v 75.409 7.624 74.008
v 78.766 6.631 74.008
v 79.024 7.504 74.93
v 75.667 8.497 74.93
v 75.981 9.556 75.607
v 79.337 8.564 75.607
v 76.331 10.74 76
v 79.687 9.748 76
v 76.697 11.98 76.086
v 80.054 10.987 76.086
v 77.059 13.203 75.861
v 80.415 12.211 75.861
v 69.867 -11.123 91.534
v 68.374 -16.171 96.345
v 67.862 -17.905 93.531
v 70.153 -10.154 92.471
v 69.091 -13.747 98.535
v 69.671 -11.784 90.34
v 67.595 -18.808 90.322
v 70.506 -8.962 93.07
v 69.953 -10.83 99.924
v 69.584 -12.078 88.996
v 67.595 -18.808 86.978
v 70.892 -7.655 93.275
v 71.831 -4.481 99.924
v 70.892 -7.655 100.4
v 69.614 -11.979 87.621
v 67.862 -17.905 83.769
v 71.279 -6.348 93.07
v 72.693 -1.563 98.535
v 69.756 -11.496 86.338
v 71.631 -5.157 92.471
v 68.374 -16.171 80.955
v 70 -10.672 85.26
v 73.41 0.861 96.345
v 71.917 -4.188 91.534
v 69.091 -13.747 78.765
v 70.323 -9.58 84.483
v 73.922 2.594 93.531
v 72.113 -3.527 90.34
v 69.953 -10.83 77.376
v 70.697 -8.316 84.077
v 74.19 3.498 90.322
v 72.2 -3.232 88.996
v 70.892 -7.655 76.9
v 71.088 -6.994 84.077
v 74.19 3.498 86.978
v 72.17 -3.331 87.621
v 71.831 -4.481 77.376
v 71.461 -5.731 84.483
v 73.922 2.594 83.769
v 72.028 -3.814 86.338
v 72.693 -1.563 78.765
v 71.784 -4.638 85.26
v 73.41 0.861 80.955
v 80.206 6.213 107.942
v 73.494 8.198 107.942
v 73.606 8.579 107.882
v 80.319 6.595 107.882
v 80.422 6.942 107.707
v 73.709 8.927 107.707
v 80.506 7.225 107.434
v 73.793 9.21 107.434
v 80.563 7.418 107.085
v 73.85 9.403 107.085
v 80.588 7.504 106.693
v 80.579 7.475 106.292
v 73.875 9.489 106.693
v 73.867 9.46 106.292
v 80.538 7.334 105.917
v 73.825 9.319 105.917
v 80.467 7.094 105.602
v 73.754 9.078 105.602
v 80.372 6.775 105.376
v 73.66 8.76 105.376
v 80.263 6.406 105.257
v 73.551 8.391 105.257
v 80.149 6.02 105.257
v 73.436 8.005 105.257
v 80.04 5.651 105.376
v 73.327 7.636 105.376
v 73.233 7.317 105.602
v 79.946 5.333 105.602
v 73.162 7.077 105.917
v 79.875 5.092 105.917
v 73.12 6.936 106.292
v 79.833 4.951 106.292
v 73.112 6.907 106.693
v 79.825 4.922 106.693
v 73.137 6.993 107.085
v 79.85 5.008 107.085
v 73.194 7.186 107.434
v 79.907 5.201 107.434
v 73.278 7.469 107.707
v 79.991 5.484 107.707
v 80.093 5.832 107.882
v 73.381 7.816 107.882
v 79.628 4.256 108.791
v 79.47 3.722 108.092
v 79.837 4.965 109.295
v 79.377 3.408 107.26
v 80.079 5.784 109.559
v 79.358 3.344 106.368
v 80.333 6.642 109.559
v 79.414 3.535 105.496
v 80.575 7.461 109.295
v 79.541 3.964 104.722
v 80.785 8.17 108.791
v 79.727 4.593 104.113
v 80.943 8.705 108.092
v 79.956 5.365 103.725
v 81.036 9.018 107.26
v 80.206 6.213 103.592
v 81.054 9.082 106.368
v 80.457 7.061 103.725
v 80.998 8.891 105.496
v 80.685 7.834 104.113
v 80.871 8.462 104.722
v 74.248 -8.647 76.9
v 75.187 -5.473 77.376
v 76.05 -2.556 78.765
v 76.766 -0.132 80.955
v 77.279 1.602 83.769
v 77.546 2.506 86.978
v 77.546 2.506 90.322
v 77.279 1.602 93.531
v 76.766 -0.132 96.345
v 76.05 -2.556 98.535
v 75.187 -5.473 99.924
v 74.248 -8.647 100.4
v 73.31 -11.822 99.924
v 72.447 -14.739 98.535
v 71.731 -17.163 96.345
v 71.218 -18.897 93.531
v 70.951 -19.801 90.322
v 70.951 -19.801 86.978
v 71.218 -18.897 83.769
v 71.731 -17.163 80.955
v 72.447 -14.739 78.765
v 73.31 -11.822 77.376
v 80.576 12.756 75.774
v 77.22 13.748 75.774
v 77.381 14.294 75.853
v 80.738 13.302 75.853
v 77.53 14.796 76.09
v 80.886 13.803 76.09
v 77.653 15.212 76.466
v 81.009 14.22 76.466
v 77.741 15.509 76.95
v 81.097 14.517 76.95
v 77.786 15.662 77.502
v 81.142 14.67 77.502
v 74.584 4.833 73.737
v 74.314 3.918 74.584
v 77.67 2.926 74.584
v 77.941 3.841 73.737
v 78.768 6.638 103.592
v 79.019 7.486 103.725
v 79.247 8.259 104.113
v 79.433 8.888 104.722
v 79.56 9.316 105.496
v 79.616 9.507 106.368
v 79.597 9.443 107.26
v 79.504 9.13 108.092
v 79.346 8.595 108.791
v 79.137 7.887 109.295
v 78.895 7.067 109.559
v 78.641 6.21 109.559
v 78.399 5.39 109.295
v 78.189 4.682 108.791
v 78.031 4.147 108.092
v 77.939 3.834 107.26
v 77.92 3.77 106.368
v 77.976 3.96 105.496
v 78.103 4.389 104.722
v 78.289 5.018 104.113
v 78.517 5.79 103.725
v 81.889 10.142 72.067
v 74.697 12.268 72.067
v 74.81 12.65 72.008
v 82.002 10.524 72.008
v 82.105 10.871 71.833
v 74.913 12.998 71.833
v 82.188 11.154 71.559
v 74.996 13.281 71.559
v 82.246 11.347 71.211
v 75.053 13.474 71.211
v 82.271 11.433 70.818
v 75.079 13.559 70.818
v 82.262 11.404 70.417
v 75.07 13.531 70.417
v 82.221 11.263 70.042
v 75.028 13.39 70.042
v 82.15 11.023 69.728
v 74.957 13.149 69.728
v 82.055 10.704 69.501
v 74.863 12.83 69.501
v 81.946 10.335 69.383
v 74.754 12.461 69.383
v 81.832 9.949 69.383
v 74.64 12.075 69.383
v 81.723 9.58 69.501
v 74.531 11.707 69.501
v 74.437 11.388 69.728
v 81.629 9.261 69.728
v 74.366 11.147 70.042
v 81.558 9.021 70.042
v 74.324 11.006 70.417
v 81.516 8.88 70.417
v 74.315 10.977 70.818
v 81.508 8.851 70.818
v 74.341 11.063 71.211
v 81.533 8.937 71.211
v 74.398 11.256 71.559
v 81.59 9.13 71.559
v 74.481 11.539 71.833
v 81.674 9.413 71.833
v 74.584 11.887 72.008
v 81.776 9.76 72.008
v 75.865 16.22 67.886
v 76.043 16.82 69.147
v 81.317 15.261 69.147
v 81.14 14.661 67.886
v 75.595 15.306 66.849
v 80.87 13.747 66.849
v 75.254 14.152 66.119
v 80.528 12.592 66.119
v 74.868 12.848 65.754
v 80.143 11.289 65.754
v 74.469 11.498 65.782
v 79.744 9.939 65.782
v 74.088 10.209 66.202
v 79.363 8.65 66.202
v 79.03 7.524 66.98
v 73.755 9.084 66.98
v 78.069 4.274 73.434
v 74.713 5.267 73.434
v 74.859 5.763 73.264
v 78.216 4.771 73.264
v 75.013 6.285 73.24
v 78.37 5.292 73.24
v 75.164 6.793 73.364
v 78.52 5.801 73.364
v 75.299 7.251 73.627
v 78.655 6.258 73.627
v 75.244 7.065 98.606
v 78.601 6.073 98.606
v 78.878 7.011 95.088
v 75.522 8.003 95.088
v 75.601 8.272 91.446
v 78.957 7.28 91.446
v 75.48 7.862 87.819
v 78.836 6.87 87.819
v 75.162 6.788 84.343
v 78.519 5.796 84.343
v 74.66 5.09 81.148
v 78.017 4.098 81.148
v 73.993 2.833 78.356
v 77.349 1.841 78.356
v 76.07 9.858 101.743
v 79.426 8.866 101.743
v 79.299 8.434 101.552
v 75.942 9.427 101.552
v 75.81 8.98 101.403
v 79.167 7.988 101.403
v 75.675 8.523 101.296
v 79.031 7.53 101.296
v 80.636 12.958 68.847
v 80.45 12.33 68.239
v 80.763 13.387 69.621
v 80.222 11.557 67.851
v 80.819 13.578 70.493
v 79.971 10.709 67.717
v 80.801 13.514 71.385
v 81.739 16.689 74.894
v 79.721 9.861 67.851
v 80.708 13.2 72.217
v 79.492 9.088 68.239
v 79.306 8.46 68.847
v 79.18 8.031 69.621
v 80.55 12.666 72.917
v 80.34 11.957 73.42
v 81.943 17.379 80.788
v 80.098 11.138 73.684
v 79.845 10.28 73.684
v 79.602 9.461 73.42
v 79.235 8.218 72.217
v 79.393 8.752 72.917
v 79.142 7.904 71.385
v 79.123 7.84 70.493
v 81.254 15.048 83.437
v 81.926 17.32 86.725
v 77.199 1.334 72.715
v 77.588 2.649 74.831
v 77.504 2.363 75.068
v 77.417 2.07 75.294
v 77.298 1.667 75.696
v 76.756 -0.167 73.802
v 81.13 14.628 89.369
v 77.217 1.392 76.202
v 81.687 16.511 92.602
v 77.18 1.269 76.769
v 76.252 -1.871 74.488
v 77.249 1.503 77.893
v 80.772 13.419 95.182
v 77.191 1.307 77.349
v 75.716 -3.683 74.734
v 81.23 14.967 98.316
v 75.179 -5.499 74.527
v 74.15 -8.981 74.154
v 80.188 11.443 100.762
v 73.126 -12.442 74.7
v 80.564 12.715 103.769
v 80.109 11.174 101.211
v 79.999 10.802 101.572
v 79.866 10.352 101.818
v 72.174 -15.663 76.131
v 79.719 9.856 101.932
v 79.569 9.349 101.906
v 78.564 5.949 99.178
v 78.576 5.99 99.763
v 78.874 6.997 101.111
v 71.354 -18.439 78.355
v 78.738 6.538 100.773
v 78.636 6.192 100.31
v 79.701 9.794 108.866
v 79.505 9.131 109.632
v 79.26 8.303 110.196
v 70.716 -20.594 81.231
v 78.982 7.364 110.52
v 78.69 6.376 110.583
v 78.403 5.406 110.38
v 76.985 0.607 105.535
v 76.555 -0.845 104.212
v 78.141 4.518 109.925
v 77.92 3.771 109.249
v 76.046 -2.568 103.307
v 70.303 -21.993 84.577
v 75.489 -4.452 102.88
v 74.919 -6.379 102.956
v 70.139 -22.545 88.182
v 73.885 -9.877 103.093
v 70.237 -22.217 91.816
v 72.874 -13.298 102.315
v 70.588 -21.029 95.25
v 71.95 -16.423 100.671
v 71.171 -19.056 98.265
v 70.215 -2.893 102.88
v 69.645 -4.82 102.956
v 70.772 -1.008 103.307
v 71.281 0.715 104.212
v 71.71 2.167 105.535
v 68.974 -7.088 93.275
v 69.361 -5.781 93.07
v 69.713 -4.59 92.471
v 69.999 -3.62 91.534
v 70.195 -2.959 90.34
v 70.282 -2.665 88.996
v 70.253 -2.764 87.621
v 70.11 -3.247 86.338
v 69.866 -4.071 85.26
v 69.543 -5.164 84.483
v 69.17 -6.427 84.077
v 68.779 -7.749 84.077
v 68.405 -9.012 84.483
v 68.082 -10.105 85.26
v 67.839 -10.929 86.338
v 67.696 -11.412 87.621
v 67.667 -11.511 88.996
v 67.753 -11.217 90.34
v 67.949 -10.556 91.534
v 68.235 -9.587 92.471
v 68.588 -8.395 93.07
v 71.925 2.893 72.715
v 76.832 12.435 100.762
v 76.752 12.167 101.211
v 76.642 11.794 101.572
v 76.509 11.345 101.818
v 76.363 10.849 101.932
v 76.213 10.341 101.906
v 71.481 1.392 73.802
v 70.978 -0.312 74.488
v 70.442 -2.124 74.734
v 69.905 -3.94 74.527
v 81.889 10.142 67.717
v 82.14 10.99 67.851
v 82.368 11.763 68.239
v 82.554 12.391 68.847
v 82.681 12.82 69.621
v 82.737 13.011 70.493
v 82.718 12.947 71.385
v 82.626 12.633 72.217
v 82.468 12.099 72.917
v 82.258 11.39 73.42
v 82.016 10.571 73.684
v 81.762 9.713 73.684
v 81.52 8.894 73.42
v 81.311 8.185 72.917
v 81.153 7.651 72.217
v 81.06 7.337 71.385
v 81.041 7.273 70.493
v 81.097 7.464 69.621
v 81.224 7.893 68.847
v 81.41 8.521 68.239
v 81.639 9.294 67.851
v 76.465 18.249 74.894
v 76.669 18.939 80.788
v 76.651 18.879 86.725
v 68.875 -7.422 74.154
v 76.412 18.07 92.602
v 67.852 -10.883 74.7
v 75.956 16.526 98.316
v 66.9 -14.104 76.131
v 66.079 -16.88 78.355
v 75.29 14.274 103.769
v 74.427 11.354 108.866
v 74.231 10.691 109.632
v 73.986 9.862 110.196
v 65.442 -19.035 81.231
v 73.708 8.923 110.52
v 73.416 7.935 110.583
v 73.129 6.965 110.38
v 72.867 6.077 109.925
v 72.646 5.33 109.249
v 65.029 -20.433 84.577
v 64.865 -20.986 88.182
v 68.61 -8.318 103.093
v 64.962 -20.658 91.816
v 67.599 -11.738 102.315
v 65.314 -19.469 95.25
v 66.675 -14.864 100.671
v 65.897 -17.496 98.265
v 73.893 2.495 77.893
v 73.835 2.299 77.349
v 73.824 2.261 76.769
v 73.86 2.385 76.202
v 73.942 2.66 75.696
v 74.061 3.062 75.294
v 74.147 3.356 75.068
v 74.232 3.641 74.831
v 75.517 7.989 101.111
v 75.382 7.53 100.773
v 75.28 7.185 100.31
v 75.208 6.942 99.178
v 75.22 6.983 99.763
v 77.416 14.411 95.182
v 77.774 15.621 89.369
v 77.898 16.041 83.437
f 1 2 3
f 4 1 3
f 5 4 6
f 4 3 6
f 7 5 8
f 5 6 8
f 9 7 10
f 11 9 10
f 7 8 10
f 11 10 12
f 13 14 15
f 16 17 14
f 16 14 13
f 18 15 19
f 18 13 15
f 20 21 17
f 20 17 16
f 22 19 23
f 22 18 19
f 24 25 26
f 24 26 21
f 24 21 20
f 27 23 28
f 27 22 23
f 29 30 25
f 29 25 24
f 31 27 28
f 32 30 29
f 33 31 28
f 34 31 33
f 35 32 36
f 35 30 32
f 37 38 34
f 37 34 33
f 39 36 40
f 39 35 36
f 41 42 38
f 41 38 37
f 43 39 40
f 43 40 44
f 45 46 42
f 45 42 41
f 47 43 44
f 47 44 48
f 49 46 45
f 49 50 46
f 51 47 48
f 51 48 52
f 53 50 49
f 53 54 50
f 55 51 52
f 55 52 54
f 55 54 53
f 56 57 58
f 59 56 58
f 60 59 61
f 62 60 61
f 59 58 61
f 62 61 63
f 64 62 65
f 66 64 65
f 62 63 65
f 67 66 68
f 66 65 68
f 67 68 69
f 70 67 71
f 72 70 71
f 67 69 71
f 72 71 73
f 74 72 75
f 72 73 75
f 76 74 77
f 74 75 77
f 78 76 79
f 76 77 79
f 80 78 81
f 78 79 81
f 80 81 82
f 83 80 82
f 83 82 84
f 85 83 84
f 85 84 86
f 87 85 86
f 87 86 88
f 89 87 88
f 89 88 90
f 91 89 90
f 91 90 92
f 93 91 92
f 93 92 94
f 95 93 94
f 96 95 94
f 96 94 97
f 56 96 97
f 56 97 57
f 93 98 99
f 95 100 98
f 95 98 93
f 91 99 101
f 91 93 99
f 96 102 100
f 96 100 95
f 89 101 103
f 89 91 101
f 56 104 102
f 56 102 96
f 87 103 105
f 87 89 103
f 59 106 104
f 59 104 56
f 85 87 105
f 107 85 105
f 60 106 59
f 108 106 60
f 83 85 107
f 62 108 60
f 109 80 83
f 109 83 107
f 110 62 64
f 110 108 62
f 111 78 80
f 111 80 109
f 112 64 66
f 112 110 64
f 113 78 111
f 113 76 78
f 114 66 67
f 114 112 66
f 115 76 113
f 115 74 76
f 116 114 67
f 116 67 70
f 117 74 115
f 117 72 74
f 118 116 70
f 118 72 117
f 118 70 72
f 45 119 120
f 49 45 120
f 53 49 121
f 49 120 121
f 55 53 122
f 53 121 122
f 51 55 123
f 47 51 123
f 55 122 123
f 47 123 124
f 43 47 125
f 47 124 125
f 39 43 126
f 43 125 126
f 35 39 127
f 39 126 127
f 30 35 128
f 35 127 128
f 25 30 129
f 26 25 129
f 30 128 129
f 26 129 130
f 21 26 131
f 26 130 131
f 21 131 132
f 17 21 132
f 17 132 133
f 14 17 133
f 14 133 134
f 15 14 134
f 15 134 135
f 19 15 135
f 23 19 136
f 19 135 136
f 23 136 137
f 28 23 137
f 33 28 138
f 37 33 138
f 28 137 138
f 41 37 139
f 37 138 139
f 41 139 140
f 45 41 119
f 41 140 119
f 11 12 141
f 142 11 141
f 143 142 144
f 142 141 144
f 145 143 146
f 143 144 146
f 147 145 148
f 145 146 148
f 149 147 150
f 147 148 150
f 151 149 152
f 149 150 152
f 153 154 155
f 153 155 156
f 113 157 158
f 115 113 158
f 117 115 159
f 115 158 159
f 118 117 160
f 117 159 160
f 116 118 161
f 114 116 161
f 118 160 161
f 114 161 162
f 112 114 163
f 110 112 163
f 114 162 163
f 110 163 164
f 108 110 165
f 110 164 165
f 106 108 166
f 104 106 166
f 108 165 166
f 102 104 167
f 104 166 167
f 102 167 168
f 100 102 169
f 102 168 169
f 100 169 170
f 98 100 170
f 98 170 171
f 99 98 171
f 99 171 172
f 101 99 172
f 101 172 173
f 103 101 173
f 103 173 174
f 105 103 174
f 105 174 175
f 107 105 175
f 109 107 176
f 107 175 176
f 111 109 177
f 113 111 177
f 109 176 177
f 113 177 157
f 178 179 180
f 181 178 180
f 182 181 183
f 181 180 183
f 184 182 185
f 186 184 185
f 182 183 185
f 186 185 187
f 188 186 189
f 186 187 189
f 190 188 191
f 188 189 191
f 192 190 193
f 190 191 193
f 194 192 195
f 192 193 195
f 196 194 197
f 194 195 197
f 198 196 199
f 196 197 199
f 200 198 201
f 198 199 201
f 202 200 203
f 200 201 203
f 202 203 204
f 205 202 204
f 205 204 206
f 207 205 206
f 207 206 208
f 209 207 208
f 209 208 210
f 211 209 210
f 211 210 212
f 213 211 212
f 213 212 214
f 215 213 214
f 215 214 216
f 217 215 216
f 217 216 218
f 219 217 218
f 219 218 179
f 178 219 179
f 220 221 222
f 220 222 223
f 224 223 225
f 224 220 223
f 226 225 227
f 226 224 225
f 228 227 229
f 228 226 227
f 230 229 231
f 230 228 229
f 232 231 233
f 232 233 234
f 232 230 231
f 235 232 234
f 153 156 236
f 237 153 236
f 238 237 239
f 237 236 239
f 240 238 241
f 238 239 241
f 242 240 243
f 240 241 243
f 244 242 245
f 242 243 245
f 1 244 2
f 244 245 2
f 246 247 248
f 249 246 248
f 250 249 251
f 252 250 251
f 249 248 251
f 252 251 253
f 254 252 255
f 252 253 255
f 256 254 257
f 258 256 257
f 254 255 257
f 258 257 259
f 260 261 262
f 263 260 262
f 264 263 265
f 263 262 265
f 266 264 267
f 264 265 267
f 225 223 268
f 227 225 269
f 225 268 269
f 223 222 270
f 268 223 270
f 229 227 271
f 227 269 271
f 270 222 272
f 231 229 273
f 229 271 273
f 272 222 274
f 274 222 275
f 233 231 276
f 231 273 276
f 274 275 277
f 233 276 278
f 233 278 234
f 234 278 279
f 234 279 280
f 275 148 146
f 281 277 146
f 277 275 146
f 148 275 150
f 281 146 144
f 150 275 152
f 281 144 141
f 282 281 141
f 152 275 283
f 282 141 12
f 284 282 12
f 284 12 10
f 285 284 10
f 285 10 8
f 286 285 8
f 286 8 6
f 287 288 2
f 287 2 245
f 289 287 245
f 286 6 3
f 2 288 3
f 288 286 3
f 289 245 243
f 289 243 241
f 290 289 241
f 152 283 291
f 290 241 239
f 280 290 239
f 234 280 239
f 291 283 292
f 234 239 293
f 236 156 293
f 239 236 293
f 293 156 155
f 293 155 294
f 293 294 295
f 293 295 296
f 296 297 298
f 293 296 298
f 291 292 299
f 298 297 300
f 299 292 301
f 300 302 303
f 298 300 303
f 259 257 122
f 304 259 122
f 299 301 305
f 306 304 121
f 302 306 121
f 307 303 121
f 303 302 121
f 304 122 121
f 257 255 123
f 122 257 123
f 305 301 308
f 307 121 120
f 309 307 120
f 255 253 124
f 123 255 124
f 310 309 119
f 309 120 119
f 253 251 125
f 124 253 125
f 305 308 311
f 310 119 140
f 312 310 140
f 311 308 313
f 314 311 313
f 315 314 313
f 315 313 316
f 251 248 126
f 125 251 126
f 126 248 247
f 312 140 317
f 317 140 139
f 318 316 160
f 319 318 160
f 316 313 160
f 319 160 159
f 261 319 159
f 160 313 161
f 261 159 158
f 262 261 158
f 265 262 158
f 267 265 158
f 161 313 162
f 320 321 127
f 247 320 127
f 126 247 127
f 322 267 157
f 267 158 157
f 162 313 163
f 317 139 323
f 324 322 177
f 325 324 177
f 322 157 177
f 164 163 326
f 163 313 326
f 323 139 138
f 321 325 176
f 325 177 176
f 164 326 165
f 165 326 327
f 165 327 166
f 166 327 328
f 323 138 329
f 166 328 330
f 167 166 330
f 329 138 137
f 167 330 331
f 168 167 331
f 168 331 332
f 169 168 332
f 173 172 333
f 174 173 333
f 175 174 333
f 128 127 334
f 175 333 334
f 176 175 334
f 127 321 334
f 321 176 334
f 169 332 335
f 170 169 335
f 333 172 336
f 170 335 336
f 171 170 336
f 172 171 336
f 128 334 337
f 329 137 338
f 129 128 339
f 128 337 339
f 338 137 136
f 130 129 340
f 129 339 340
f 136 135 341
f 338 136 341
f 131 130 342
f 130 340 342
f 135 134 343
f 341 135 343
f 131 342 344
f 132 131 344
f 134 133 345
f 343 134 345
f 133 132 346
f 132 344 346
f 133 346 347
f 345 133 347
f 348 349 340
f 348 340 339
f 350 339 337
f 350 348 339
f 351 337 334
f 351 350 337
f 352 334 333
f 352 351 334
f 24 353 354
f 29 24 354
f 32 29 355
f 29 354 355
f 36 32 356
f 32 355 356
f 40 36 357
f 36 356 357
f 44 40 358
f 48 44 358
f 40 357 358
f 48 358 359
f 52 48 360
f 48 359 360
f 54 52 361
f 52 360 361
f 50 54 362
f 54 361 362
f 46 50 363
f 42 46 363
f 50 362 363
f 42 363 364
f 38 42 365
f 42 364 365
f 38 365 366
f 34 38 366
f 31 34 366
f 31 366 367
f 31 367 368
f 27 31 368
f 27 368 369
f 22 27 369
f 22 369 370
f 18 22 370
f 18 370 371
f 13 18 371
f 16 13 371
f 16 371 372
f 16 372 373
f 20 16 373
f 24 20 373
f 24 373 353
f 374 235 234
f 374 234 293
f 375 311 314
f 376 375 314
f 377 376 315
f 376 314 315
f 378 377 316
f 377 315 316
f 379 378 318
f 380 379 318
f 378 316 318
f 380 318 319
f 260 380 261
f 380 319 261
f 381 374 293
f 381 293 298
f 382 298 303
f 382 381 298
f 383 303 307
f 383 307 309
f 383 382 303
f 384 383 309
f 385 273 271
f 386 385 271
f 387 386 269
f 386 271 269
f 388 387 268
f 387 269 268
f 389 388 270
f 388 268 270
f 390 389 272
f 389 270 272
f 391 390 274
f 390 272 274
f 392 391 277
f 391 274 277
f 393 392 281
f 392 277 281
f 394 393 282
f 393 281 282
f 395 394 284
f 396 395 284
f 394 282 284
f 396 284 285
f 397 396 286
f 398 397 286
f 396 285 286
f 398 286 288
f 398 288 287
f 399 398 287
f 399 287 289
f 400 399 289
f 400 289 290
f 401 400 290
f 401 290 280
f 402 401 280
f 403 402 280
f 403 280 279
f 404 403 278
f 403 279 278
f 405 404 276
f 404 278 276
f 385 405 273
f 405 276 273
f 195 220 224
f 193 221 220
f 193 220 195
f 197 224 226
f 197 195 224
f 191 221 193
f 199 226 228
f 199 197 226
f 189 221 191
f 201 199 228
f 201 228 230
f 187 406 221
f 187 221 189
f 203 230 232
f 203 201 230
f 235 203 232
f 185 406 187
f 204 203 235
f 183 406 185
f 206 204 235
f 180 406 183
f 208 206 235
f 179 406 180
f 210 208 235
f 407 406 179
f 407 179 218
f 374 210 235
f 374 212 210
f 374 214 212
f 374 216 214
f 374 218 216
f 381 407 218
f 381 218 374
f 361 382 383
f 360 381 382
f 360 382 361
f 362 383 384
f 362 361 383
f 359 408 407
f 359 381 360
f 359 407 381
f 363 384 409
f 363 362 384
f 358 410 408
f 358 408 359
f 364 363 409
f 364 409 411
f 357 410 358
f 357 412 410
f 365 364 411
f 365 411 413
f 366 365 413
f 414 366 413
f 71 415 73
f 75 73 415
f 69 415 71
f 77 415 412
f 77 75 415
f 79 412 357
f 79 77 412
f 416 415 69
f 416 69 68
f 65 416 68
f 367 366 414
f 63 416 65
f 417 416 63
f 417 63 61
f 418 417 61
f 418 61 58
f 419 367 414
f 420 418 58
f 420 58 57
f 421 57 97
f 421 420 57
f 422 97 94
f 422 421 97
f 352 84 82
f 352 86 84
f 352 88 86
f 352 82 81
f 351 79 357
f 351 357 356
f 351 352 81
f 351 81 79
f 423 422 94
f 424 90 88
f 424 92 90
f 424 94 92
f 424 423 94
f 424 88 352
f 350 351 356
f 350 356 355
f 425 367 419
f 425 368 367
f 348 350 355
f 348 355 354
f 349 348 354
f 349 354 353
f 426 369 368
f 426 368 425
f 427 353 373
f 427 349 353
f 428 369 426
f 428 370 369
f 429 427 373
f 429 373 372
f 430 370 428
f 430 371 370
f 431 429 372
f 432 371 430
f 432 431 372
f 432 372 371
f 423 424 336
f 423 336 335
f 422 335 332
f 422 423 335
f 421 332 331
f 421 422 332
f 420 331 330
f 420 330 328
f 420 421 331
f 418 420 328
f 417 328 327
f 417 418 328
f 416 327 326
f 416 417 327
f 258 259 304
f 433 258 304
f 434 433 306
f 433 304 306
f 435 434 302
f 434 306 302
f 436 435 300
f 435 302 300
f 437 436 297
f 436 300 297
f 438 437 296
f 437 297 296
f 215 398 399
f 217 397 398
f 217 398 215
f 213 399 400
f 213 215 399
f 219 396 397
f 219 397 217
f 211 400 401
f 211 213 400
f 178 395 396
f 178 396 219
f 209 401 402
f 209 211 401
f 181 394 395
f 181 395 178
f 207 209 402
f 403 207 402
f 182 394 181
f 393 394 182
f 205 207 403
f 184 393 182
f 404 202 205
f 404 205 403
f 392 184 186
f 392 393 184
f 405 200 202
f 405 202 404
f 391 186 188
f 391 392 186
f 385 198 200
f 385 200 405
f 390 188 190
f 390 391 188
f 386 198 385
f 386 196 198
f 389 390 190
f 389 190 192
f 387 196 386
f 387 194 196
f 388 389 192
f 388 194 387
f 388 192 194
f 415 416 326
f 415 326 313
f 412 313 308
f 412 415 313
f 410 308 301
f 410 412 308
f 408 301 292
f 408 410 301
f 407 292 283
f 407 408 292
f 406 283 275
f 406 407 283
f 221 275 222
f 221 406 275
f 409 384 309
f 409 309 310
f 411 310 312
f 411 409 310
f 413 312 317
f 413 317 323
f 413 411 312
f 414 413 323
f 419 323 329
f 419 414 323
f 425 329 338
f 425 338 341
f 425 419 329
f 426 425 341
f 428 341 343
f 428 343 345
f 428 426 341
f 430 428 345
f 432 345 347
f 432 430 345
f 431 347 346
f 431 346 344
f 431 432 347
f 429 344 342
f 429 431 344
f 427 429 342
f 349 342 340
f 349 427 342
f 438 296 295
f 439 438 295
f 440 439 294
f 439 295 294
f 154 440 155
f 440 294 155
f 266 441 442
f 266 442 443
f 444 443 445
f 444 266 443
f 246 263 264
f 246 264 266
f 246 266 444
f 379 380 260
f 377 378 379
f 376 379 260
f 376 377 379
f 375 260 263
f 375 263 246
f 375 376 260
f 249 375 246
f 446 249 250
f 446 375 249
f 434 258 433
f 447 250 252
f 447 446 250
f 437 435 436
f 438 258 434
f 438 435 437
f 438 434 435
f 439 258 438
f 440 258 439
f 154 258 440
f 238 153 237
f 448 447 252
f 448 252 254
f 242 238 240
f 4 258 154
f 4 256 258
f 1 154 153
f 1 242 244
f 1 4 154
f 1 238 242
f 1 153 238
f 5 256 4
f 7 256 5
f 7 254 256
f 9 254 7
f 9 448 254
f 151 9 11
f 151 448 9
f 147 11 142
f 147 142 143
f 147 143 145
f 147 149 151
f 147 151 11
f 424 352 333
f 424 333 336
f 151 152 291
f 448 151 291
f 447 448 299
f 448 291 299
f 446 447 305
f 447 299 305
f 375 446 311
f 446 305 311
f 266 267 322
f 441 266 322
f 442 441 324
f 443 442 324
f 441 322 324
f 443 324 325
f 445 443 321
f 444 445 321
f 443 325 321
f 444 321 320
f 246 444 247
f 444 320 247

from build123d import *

# Parameters (mm, degrees)
BOSS_EXTRUDE1_DEPTH = 5.5
SKETCH2_R           = 3
BOSS_EXTRUDE2_DEPTH = 1.5
SKETCH3_R           = 1.35
CUT_EXTRUDE1_DEPTH  = 17.840471554
SKETCH4_R           = 3
BOSS_EXTRUDE3_DEPTH = 2
SKETCH5_R           = 1.35
CUT_EXTRUDE2_DEPTH  = 18.585311609
SKETCH6_R           = 11.75
CUT_EXTRUDE3_DEPTH  = 3.5
SKETCH7_R           = 4.625
CUT_EXTRUDE4_DEPTH  = 18.585311609
CUT_EXTRUDE5_DEPTH  = 3.5


with BuildPart() as part:
    # Sketch1 → Boss-Extrude1 (new body)
    with BuildSketch(Plane(origin=(65.356779706, -19.323104474, 0), x_dir=(-0.28352355, -0.958965274, 0), z_dir=(-0.958965274, 0.28352355, 0))):
        with BuildLine():
            Line((-22.409230804, 105.535335292), (-25.708238472, 109.248684924))
            ThreePointArc((-25.708238472, 109.248684924), (-28.941829317, 110.584612338), (-31.989317839, 108.866000829))
            ThreePointArc((-31.989317839, 108.866000829), (-39.5119826, 89.676955929), (-37.690186632, 69.146710224))
            ThreePointArc((-37.690186632, 69.146710224), (-34.240446028, 65.888665427), (-29.622491121, 66.979563497))
            Line((-29.622491121, 66.979563497), (-23.166630632, 72.715067926))
            ThreePointArc((-23.166630632, 72.715067926), (-19.824639339, 74.487704396), (-16.041831895, 74.526610749))
            ThreePointArc((-16.041831895, 74.526610749), (1.733883997, 88.181945854), (-15.123670288, 102.955811829))
            ThreePointArc((-15.123670288, 102.955811829), (-19.098619321, 103.307401938), (-22.409230804, 105.535335292))
        make_face()
    extrude(amount=-BOSS_EXTRUDE1_DEPTH)

    # Sketch2 → Boss-Extrude2 (add)
    with BuildSketch(Plane(origin=(70.631088713, -20.882483997, 0), x_dir=(0, 0, -1), z_dir=(0.958965274, -0.28352355, 0))):
        with Locations((-106.592015807, 28.69857444)):
            Circle(SKETCH2_R)
    extrude(amount=BOSS_EXTRUDE2_DEPTH)

    # Sketch3 → Cut-Extrude1 (cut, through all)
    with BuildSketch(Plane(origin=(65.356779706, -19.323104474, 0), x_dir=(0, 0, 1), z_dir=(-0.958965274, 0.28352355, 0))):
        with Locations((106.592015807, 28.69857444)):
            Circle(SKETCH3_R)
    extrude(amount=-CUT_EXTRUDE1_DEPTH, mode=Mode.SUBTRACT)

    # Sketch4 → Boss-Extrude3 (add)
    with BuildSketch(Plane(origin=(70.631088713, -20.882483997, 0), x_dir=(0, 0, -1), z_dir=(0.958965274, -0.28352355, 0))):
        with Locations((-70.717483457, 32.943327517)):
            Circle(SKETCH4_R)
    extrude(amount=BOSS_EXTRUDE3_DEPTH)

    # Sketch5 → Cut-Extrude2 (cut, through all)
    with BuildSketch(Plane(origin=(65.356779706, -19.323104474, 0), x_dir=(0, 0, 1), z_dir=(-0.958965274, 0.28352355, 0))):
        with Locations((70.717483457, 32.943327517)):
            Circle(SKETCH5_R)
    extrude(amount=-CUT_EXTRUDE2_DEPTH, mode=Mode.SUBTRACT)

    # Sketch6 → Cut-Extrude3 (cut)
    with BuildSketch(Plane(origin=(70.631088713, -20.882483997, 0), x_dir=(0, 0, -1), z_dir=(0.958965274, -0.28352355, 0))):
        with Locations((-88.65, 12.758559735)):
            Circle(SKETCH6_R)
    extrude(amount=-CUT_EXTRUDE3_DEPTH, mode=Mode.SUBTRACT)

    # Sketch7 → Cut-Extrude4 (cut, through all)
    with BuildSketch(Plane(origin=(65.356779706, -19.323104474, 0), x_dir=(0, 0, 1), z_dir=(-0.958965274, 0.28352355, 0))):
        with Locations((88.65, 12.758559735)):
            Circle(SKETCH7_R)
    extrude(amount=-CUT_EXTRUDE4_DEPTH, mode=Mode.SUBTRACT)

    # Sketch8 → Cut-Extrude5 (cut)
    with BuildSketch(Plane(origin=(70.631088713, -20.882483997, 0), x_dir=(0, 0, -1), z_dir=(0.958965274, -0.28352355, 0))):
        with BuildLine():
            Line((-74.584027906, 24.82704883), (-73.736581379, 25.780931199))
            ThreePointArc((-73.736581379, 25.780931199), (-73.240380162, 27.294869383), (-74.007814455, 28.691031651))
            ThreePointArc((-74.007814455, 28.691031651), (-75.840549655, 31.311613406), (-75.860990165, 34.509417221))
            ThreePointArc((-75.860990165, 34.509417221), (-76.089806816, 36.170205007), (-77.502198812, 37.073378292))
            ThreePointArc((-77.502198812, 37.073378292), (-89.36916003, 37.030513551), (-100.761658133, 33.708226249))
            ThreePointArc((-100.761658133, 33.708226249), (-101.817813371, 32.571238358), (-101.742925567, 31.021207013))
            ThreePointArc((-101.742925567, 31.021207013), (-101.4721051, 30.340162869), (-101.296421193, 29.628615248))
            ThreePointArc((-101.296421193, 29.628615248), (-100.31044829, 28.233312085), (-98.606486741, 28.10869859))
            ThreePointArc((-98.606486741, 28.10869859), (-87.819157421, 28.939652392), (-78.355573806, 23.695842402))
            ThreePointArc((-78.355573806, 23.695842402), (-76.768954569, 23.099003898), (-75.294048195, 23.934604274))
            ThreePointArc((-75.294048195, 23.934604274), (-74.951163338, 24.390473315), (-74.584027906, 24.82704883))
        make_face()
    extrude(amount=-CUT_EXTRUDE5_DEPTH, mode=Mode.SUBTRACT)


solid = part.part
